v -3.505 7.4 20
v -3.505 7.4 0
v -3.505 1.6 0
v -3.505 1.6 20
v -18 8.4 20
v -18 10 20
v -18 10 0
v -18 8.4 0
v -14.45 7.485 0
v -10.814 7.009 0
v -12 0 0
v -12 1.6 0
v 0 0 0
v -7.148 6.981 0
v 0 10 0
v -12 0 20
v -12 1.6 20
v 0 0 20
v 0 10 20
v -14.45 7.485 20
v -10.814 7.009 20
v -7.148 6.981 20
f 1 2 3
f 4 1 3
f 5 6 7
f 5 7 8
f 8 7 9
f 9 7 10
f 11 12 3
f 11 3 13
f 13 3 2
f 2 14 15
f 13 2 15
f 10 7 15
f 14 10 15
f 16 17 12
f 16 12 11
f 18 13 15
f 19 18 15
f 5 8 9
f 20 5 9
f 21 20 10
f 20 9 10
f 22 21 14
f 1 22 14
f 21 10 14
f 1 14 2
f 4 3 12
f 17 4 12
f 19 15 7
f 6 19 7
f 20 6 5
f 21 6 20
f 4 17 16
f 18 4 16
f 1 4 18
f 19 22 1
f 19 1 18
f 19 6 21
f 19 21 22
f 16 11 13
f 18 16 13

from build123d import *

# Parameters (mm, degrees)
F1_DEPTH = 20


with BuildPart() as f1:
    # F0 (on Top) → F1 (new body)
    with BuildSketch(Plane.XY):
        with BuildLine():
            Line((-12, 1.6), (-12, 0))
            Line((-12, 0), (0, 0))
            Line((0, 0), (0, 10))
            Line((0, 10), (-18, 10))
            Line((-18, 10), (-18, 8.4))
            ThreePointArc((-18, 8.4), (-10.814003, 7.009238), (-3.505098, 7.4))
            Line((-3.505098, 7.4), (-3.505098, 1.6))
            Line((-3.505098, 1.6), (-12, 1.6))
        make_face()
    extrude(amount=F1_DEPTH)


solid = f1.part
